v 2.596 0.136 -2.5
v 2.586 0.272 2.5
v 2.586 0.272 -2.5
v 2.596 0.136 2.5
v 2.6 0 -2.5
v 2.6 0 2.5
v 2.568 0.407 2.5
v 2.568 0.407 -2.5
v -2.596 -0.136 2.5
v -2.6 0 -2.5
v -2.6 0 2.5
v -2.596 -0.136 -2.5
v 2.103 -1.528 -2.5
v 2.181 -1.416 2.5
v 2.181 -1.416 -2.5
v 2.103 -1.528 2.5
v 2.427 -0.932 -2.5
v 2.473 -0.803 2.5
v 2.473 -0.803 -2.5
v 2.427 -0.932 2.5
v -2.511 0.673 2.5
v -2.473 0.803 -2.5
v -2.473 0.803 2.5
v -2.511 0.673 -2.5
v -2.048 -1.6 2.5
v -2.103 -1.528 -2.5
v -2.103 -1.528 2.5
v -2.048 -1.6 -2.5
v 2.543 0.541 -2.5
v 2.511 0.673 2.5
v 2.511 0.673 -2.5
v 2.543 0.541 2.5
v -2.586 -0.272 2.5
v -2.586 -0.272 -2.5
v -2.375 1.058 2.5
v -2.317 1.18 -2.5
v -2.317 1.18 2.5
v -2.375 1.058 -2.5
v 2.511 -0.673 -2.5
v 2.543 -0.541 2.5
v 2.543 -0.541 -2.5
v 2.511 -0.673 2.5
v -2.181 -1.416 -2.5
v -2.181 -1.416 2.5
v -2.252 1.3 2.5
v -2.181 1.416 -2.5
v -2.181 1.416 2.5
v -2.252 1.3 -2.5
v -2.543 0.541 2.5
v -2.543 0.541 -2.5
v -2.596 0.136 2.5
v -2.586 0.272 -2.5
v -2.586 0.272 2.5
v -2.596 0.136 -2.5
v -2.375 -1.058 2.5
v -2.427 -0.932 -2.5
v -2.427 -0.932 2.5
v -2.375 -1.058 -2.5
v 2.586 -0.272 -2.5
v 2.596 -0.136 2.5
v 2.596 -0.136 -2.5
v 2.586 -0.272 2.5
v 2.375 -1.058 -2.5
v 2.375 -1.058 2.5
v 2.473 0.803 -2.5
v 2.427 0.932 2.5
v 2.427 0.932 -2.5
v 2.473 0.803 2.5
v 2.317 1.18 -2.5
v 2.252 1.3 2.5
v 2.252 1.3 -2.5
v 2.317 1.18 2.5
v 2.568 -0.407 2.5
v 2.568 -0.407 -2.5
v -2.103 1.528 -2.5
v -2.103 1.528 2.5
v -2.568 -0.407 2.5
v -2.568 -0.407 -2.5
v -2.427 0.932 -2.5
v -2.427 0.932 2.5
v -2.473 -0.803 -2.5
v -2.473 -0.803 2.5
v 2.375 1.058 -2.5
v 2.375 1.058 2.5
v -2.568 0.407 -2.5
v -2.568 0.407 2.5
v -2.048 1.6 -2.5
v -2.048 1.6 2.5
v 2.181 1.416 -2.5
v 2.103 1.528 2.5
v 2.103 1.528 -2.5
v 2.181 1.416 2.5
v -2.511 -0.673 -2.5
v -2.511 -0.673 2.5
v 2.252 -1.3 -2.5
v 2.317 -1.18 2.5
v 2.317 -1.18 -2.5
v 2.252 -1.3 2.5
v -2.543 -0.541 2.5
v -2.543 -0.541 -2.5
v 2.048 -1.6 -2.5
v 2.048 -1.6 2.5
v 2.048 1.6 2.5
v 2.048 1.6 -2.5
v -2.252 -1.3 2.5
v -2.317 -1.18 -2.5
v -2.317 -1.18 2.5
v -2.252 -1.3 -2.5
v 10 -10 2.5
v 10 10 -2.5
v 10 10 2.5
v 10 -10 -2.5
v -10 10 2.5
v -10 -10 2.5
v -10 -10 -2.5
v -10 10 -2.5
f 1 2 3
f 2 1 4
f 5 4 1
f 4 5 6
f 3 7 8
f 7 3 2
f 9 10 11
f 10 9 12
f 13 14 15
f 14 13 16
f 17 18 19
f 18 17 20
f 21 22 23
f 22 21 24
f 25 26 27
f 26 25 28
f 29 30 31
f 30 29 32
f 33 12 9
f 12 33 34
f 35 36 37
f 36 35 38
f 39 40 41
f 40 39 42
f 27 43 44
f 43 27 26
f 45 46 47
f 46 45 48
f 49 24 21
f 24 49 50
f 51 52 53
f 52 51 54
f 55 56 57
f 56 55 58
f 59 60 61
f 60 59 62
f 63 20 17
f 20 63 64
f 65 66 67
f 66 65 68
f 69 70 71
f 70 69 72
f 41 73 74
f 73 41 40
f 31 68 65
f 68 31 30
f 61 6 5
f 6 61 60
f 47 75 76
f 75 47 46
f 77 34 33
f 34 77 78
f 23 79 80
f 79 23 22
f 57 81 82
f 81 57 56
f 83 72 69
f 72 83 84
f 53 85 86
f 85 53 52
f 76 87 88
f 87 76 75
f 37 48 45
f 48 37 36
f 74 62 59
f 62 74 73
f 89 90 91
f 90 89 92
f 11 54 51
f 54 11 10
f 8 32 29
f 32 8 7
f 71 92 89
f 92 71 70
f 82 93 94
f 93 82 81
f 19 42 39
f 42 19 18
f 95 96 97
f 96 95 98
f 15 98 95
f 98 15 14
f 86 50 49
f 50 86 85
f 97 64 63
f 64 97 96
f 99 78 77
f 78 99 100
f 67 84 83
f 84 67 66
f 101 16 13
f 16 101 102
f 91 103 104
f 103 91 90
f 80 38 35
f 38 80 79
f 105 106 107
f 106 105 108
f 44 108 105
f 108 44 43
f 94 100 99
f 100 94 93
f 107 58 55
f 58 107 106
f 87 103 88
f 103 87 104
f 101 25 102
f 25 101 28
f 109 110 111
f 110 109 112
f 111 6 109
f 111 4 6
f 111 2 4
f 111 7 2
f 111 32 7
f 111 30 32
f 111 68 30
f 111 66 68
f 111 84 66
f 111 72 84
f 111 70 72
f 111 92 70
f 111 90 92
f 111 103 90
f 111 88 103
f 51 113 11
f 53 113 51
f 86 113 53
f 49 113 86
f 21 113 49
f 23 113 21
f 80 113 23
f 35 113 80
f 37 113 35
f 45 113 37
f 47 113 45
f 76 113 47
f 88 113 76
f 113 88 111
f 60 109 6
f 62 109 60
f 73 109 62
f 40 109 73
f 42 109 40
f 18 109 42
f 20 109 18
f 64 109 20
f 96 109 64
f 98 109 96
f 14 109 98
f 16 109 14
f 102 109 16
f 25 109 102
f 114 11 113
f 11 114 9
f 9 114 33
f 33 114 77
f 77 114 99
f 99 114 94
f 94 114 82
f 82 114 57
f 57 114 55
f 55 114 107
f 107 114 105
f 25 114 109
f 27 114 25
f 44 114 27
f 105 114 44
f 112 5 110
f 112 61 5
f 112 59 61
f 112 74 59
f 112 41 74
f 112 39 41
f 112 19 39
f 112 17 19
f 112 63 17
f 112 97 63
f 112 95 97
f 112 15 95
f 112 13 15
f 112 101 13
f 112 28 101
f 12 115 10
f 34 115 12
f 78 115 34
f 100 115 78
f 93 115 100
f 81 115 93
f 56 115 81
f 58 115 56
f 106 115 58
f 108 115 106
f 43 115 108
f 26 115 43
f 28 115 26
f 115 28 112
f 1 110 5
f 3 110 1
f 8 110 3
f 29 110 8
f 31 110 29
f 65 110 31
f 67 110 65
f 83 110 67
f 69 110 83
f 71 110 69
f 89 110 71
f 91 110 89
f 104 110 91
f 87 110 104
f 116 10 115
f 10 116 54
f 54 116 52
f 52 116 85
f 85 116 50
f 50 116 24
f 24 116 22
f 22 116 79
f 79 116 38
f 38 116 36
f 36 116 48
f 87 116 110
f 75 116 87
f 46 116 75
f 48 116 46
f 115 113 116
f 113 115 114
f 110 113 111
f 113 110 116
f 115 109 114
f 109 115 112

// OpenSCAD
my_nbfaces=120;

radius_splitflap = 34.5;
card_width = 39.5;

/* rotor 2 */

ext_border = 3;
int_border = 5;
wheel_thickness = 2.5;
wall_thickness = 1.2;
interfacing_thickness = 1.7;
rotor1_wall_height = 7;
axis_base_radius = 8;
axis_top_radius = 5.2;

hole_radius = 1.2;
slack = 0.5;

min_interfacing_high = 16;
max_interfacing_high = 20.5;

difference() {
    cube([20, 20, 5], center=true);
    
    /* Hole for the motor axis */
    translate([0, 0, -5])
    intersection() {
        cylinder(h = max_interfacing_high + 2, r = 2.6, $fn=my_nbfaces);    
        cube([50, 3.2, 2*(max_interfacing_high + 2)], center = true);
    }
}
